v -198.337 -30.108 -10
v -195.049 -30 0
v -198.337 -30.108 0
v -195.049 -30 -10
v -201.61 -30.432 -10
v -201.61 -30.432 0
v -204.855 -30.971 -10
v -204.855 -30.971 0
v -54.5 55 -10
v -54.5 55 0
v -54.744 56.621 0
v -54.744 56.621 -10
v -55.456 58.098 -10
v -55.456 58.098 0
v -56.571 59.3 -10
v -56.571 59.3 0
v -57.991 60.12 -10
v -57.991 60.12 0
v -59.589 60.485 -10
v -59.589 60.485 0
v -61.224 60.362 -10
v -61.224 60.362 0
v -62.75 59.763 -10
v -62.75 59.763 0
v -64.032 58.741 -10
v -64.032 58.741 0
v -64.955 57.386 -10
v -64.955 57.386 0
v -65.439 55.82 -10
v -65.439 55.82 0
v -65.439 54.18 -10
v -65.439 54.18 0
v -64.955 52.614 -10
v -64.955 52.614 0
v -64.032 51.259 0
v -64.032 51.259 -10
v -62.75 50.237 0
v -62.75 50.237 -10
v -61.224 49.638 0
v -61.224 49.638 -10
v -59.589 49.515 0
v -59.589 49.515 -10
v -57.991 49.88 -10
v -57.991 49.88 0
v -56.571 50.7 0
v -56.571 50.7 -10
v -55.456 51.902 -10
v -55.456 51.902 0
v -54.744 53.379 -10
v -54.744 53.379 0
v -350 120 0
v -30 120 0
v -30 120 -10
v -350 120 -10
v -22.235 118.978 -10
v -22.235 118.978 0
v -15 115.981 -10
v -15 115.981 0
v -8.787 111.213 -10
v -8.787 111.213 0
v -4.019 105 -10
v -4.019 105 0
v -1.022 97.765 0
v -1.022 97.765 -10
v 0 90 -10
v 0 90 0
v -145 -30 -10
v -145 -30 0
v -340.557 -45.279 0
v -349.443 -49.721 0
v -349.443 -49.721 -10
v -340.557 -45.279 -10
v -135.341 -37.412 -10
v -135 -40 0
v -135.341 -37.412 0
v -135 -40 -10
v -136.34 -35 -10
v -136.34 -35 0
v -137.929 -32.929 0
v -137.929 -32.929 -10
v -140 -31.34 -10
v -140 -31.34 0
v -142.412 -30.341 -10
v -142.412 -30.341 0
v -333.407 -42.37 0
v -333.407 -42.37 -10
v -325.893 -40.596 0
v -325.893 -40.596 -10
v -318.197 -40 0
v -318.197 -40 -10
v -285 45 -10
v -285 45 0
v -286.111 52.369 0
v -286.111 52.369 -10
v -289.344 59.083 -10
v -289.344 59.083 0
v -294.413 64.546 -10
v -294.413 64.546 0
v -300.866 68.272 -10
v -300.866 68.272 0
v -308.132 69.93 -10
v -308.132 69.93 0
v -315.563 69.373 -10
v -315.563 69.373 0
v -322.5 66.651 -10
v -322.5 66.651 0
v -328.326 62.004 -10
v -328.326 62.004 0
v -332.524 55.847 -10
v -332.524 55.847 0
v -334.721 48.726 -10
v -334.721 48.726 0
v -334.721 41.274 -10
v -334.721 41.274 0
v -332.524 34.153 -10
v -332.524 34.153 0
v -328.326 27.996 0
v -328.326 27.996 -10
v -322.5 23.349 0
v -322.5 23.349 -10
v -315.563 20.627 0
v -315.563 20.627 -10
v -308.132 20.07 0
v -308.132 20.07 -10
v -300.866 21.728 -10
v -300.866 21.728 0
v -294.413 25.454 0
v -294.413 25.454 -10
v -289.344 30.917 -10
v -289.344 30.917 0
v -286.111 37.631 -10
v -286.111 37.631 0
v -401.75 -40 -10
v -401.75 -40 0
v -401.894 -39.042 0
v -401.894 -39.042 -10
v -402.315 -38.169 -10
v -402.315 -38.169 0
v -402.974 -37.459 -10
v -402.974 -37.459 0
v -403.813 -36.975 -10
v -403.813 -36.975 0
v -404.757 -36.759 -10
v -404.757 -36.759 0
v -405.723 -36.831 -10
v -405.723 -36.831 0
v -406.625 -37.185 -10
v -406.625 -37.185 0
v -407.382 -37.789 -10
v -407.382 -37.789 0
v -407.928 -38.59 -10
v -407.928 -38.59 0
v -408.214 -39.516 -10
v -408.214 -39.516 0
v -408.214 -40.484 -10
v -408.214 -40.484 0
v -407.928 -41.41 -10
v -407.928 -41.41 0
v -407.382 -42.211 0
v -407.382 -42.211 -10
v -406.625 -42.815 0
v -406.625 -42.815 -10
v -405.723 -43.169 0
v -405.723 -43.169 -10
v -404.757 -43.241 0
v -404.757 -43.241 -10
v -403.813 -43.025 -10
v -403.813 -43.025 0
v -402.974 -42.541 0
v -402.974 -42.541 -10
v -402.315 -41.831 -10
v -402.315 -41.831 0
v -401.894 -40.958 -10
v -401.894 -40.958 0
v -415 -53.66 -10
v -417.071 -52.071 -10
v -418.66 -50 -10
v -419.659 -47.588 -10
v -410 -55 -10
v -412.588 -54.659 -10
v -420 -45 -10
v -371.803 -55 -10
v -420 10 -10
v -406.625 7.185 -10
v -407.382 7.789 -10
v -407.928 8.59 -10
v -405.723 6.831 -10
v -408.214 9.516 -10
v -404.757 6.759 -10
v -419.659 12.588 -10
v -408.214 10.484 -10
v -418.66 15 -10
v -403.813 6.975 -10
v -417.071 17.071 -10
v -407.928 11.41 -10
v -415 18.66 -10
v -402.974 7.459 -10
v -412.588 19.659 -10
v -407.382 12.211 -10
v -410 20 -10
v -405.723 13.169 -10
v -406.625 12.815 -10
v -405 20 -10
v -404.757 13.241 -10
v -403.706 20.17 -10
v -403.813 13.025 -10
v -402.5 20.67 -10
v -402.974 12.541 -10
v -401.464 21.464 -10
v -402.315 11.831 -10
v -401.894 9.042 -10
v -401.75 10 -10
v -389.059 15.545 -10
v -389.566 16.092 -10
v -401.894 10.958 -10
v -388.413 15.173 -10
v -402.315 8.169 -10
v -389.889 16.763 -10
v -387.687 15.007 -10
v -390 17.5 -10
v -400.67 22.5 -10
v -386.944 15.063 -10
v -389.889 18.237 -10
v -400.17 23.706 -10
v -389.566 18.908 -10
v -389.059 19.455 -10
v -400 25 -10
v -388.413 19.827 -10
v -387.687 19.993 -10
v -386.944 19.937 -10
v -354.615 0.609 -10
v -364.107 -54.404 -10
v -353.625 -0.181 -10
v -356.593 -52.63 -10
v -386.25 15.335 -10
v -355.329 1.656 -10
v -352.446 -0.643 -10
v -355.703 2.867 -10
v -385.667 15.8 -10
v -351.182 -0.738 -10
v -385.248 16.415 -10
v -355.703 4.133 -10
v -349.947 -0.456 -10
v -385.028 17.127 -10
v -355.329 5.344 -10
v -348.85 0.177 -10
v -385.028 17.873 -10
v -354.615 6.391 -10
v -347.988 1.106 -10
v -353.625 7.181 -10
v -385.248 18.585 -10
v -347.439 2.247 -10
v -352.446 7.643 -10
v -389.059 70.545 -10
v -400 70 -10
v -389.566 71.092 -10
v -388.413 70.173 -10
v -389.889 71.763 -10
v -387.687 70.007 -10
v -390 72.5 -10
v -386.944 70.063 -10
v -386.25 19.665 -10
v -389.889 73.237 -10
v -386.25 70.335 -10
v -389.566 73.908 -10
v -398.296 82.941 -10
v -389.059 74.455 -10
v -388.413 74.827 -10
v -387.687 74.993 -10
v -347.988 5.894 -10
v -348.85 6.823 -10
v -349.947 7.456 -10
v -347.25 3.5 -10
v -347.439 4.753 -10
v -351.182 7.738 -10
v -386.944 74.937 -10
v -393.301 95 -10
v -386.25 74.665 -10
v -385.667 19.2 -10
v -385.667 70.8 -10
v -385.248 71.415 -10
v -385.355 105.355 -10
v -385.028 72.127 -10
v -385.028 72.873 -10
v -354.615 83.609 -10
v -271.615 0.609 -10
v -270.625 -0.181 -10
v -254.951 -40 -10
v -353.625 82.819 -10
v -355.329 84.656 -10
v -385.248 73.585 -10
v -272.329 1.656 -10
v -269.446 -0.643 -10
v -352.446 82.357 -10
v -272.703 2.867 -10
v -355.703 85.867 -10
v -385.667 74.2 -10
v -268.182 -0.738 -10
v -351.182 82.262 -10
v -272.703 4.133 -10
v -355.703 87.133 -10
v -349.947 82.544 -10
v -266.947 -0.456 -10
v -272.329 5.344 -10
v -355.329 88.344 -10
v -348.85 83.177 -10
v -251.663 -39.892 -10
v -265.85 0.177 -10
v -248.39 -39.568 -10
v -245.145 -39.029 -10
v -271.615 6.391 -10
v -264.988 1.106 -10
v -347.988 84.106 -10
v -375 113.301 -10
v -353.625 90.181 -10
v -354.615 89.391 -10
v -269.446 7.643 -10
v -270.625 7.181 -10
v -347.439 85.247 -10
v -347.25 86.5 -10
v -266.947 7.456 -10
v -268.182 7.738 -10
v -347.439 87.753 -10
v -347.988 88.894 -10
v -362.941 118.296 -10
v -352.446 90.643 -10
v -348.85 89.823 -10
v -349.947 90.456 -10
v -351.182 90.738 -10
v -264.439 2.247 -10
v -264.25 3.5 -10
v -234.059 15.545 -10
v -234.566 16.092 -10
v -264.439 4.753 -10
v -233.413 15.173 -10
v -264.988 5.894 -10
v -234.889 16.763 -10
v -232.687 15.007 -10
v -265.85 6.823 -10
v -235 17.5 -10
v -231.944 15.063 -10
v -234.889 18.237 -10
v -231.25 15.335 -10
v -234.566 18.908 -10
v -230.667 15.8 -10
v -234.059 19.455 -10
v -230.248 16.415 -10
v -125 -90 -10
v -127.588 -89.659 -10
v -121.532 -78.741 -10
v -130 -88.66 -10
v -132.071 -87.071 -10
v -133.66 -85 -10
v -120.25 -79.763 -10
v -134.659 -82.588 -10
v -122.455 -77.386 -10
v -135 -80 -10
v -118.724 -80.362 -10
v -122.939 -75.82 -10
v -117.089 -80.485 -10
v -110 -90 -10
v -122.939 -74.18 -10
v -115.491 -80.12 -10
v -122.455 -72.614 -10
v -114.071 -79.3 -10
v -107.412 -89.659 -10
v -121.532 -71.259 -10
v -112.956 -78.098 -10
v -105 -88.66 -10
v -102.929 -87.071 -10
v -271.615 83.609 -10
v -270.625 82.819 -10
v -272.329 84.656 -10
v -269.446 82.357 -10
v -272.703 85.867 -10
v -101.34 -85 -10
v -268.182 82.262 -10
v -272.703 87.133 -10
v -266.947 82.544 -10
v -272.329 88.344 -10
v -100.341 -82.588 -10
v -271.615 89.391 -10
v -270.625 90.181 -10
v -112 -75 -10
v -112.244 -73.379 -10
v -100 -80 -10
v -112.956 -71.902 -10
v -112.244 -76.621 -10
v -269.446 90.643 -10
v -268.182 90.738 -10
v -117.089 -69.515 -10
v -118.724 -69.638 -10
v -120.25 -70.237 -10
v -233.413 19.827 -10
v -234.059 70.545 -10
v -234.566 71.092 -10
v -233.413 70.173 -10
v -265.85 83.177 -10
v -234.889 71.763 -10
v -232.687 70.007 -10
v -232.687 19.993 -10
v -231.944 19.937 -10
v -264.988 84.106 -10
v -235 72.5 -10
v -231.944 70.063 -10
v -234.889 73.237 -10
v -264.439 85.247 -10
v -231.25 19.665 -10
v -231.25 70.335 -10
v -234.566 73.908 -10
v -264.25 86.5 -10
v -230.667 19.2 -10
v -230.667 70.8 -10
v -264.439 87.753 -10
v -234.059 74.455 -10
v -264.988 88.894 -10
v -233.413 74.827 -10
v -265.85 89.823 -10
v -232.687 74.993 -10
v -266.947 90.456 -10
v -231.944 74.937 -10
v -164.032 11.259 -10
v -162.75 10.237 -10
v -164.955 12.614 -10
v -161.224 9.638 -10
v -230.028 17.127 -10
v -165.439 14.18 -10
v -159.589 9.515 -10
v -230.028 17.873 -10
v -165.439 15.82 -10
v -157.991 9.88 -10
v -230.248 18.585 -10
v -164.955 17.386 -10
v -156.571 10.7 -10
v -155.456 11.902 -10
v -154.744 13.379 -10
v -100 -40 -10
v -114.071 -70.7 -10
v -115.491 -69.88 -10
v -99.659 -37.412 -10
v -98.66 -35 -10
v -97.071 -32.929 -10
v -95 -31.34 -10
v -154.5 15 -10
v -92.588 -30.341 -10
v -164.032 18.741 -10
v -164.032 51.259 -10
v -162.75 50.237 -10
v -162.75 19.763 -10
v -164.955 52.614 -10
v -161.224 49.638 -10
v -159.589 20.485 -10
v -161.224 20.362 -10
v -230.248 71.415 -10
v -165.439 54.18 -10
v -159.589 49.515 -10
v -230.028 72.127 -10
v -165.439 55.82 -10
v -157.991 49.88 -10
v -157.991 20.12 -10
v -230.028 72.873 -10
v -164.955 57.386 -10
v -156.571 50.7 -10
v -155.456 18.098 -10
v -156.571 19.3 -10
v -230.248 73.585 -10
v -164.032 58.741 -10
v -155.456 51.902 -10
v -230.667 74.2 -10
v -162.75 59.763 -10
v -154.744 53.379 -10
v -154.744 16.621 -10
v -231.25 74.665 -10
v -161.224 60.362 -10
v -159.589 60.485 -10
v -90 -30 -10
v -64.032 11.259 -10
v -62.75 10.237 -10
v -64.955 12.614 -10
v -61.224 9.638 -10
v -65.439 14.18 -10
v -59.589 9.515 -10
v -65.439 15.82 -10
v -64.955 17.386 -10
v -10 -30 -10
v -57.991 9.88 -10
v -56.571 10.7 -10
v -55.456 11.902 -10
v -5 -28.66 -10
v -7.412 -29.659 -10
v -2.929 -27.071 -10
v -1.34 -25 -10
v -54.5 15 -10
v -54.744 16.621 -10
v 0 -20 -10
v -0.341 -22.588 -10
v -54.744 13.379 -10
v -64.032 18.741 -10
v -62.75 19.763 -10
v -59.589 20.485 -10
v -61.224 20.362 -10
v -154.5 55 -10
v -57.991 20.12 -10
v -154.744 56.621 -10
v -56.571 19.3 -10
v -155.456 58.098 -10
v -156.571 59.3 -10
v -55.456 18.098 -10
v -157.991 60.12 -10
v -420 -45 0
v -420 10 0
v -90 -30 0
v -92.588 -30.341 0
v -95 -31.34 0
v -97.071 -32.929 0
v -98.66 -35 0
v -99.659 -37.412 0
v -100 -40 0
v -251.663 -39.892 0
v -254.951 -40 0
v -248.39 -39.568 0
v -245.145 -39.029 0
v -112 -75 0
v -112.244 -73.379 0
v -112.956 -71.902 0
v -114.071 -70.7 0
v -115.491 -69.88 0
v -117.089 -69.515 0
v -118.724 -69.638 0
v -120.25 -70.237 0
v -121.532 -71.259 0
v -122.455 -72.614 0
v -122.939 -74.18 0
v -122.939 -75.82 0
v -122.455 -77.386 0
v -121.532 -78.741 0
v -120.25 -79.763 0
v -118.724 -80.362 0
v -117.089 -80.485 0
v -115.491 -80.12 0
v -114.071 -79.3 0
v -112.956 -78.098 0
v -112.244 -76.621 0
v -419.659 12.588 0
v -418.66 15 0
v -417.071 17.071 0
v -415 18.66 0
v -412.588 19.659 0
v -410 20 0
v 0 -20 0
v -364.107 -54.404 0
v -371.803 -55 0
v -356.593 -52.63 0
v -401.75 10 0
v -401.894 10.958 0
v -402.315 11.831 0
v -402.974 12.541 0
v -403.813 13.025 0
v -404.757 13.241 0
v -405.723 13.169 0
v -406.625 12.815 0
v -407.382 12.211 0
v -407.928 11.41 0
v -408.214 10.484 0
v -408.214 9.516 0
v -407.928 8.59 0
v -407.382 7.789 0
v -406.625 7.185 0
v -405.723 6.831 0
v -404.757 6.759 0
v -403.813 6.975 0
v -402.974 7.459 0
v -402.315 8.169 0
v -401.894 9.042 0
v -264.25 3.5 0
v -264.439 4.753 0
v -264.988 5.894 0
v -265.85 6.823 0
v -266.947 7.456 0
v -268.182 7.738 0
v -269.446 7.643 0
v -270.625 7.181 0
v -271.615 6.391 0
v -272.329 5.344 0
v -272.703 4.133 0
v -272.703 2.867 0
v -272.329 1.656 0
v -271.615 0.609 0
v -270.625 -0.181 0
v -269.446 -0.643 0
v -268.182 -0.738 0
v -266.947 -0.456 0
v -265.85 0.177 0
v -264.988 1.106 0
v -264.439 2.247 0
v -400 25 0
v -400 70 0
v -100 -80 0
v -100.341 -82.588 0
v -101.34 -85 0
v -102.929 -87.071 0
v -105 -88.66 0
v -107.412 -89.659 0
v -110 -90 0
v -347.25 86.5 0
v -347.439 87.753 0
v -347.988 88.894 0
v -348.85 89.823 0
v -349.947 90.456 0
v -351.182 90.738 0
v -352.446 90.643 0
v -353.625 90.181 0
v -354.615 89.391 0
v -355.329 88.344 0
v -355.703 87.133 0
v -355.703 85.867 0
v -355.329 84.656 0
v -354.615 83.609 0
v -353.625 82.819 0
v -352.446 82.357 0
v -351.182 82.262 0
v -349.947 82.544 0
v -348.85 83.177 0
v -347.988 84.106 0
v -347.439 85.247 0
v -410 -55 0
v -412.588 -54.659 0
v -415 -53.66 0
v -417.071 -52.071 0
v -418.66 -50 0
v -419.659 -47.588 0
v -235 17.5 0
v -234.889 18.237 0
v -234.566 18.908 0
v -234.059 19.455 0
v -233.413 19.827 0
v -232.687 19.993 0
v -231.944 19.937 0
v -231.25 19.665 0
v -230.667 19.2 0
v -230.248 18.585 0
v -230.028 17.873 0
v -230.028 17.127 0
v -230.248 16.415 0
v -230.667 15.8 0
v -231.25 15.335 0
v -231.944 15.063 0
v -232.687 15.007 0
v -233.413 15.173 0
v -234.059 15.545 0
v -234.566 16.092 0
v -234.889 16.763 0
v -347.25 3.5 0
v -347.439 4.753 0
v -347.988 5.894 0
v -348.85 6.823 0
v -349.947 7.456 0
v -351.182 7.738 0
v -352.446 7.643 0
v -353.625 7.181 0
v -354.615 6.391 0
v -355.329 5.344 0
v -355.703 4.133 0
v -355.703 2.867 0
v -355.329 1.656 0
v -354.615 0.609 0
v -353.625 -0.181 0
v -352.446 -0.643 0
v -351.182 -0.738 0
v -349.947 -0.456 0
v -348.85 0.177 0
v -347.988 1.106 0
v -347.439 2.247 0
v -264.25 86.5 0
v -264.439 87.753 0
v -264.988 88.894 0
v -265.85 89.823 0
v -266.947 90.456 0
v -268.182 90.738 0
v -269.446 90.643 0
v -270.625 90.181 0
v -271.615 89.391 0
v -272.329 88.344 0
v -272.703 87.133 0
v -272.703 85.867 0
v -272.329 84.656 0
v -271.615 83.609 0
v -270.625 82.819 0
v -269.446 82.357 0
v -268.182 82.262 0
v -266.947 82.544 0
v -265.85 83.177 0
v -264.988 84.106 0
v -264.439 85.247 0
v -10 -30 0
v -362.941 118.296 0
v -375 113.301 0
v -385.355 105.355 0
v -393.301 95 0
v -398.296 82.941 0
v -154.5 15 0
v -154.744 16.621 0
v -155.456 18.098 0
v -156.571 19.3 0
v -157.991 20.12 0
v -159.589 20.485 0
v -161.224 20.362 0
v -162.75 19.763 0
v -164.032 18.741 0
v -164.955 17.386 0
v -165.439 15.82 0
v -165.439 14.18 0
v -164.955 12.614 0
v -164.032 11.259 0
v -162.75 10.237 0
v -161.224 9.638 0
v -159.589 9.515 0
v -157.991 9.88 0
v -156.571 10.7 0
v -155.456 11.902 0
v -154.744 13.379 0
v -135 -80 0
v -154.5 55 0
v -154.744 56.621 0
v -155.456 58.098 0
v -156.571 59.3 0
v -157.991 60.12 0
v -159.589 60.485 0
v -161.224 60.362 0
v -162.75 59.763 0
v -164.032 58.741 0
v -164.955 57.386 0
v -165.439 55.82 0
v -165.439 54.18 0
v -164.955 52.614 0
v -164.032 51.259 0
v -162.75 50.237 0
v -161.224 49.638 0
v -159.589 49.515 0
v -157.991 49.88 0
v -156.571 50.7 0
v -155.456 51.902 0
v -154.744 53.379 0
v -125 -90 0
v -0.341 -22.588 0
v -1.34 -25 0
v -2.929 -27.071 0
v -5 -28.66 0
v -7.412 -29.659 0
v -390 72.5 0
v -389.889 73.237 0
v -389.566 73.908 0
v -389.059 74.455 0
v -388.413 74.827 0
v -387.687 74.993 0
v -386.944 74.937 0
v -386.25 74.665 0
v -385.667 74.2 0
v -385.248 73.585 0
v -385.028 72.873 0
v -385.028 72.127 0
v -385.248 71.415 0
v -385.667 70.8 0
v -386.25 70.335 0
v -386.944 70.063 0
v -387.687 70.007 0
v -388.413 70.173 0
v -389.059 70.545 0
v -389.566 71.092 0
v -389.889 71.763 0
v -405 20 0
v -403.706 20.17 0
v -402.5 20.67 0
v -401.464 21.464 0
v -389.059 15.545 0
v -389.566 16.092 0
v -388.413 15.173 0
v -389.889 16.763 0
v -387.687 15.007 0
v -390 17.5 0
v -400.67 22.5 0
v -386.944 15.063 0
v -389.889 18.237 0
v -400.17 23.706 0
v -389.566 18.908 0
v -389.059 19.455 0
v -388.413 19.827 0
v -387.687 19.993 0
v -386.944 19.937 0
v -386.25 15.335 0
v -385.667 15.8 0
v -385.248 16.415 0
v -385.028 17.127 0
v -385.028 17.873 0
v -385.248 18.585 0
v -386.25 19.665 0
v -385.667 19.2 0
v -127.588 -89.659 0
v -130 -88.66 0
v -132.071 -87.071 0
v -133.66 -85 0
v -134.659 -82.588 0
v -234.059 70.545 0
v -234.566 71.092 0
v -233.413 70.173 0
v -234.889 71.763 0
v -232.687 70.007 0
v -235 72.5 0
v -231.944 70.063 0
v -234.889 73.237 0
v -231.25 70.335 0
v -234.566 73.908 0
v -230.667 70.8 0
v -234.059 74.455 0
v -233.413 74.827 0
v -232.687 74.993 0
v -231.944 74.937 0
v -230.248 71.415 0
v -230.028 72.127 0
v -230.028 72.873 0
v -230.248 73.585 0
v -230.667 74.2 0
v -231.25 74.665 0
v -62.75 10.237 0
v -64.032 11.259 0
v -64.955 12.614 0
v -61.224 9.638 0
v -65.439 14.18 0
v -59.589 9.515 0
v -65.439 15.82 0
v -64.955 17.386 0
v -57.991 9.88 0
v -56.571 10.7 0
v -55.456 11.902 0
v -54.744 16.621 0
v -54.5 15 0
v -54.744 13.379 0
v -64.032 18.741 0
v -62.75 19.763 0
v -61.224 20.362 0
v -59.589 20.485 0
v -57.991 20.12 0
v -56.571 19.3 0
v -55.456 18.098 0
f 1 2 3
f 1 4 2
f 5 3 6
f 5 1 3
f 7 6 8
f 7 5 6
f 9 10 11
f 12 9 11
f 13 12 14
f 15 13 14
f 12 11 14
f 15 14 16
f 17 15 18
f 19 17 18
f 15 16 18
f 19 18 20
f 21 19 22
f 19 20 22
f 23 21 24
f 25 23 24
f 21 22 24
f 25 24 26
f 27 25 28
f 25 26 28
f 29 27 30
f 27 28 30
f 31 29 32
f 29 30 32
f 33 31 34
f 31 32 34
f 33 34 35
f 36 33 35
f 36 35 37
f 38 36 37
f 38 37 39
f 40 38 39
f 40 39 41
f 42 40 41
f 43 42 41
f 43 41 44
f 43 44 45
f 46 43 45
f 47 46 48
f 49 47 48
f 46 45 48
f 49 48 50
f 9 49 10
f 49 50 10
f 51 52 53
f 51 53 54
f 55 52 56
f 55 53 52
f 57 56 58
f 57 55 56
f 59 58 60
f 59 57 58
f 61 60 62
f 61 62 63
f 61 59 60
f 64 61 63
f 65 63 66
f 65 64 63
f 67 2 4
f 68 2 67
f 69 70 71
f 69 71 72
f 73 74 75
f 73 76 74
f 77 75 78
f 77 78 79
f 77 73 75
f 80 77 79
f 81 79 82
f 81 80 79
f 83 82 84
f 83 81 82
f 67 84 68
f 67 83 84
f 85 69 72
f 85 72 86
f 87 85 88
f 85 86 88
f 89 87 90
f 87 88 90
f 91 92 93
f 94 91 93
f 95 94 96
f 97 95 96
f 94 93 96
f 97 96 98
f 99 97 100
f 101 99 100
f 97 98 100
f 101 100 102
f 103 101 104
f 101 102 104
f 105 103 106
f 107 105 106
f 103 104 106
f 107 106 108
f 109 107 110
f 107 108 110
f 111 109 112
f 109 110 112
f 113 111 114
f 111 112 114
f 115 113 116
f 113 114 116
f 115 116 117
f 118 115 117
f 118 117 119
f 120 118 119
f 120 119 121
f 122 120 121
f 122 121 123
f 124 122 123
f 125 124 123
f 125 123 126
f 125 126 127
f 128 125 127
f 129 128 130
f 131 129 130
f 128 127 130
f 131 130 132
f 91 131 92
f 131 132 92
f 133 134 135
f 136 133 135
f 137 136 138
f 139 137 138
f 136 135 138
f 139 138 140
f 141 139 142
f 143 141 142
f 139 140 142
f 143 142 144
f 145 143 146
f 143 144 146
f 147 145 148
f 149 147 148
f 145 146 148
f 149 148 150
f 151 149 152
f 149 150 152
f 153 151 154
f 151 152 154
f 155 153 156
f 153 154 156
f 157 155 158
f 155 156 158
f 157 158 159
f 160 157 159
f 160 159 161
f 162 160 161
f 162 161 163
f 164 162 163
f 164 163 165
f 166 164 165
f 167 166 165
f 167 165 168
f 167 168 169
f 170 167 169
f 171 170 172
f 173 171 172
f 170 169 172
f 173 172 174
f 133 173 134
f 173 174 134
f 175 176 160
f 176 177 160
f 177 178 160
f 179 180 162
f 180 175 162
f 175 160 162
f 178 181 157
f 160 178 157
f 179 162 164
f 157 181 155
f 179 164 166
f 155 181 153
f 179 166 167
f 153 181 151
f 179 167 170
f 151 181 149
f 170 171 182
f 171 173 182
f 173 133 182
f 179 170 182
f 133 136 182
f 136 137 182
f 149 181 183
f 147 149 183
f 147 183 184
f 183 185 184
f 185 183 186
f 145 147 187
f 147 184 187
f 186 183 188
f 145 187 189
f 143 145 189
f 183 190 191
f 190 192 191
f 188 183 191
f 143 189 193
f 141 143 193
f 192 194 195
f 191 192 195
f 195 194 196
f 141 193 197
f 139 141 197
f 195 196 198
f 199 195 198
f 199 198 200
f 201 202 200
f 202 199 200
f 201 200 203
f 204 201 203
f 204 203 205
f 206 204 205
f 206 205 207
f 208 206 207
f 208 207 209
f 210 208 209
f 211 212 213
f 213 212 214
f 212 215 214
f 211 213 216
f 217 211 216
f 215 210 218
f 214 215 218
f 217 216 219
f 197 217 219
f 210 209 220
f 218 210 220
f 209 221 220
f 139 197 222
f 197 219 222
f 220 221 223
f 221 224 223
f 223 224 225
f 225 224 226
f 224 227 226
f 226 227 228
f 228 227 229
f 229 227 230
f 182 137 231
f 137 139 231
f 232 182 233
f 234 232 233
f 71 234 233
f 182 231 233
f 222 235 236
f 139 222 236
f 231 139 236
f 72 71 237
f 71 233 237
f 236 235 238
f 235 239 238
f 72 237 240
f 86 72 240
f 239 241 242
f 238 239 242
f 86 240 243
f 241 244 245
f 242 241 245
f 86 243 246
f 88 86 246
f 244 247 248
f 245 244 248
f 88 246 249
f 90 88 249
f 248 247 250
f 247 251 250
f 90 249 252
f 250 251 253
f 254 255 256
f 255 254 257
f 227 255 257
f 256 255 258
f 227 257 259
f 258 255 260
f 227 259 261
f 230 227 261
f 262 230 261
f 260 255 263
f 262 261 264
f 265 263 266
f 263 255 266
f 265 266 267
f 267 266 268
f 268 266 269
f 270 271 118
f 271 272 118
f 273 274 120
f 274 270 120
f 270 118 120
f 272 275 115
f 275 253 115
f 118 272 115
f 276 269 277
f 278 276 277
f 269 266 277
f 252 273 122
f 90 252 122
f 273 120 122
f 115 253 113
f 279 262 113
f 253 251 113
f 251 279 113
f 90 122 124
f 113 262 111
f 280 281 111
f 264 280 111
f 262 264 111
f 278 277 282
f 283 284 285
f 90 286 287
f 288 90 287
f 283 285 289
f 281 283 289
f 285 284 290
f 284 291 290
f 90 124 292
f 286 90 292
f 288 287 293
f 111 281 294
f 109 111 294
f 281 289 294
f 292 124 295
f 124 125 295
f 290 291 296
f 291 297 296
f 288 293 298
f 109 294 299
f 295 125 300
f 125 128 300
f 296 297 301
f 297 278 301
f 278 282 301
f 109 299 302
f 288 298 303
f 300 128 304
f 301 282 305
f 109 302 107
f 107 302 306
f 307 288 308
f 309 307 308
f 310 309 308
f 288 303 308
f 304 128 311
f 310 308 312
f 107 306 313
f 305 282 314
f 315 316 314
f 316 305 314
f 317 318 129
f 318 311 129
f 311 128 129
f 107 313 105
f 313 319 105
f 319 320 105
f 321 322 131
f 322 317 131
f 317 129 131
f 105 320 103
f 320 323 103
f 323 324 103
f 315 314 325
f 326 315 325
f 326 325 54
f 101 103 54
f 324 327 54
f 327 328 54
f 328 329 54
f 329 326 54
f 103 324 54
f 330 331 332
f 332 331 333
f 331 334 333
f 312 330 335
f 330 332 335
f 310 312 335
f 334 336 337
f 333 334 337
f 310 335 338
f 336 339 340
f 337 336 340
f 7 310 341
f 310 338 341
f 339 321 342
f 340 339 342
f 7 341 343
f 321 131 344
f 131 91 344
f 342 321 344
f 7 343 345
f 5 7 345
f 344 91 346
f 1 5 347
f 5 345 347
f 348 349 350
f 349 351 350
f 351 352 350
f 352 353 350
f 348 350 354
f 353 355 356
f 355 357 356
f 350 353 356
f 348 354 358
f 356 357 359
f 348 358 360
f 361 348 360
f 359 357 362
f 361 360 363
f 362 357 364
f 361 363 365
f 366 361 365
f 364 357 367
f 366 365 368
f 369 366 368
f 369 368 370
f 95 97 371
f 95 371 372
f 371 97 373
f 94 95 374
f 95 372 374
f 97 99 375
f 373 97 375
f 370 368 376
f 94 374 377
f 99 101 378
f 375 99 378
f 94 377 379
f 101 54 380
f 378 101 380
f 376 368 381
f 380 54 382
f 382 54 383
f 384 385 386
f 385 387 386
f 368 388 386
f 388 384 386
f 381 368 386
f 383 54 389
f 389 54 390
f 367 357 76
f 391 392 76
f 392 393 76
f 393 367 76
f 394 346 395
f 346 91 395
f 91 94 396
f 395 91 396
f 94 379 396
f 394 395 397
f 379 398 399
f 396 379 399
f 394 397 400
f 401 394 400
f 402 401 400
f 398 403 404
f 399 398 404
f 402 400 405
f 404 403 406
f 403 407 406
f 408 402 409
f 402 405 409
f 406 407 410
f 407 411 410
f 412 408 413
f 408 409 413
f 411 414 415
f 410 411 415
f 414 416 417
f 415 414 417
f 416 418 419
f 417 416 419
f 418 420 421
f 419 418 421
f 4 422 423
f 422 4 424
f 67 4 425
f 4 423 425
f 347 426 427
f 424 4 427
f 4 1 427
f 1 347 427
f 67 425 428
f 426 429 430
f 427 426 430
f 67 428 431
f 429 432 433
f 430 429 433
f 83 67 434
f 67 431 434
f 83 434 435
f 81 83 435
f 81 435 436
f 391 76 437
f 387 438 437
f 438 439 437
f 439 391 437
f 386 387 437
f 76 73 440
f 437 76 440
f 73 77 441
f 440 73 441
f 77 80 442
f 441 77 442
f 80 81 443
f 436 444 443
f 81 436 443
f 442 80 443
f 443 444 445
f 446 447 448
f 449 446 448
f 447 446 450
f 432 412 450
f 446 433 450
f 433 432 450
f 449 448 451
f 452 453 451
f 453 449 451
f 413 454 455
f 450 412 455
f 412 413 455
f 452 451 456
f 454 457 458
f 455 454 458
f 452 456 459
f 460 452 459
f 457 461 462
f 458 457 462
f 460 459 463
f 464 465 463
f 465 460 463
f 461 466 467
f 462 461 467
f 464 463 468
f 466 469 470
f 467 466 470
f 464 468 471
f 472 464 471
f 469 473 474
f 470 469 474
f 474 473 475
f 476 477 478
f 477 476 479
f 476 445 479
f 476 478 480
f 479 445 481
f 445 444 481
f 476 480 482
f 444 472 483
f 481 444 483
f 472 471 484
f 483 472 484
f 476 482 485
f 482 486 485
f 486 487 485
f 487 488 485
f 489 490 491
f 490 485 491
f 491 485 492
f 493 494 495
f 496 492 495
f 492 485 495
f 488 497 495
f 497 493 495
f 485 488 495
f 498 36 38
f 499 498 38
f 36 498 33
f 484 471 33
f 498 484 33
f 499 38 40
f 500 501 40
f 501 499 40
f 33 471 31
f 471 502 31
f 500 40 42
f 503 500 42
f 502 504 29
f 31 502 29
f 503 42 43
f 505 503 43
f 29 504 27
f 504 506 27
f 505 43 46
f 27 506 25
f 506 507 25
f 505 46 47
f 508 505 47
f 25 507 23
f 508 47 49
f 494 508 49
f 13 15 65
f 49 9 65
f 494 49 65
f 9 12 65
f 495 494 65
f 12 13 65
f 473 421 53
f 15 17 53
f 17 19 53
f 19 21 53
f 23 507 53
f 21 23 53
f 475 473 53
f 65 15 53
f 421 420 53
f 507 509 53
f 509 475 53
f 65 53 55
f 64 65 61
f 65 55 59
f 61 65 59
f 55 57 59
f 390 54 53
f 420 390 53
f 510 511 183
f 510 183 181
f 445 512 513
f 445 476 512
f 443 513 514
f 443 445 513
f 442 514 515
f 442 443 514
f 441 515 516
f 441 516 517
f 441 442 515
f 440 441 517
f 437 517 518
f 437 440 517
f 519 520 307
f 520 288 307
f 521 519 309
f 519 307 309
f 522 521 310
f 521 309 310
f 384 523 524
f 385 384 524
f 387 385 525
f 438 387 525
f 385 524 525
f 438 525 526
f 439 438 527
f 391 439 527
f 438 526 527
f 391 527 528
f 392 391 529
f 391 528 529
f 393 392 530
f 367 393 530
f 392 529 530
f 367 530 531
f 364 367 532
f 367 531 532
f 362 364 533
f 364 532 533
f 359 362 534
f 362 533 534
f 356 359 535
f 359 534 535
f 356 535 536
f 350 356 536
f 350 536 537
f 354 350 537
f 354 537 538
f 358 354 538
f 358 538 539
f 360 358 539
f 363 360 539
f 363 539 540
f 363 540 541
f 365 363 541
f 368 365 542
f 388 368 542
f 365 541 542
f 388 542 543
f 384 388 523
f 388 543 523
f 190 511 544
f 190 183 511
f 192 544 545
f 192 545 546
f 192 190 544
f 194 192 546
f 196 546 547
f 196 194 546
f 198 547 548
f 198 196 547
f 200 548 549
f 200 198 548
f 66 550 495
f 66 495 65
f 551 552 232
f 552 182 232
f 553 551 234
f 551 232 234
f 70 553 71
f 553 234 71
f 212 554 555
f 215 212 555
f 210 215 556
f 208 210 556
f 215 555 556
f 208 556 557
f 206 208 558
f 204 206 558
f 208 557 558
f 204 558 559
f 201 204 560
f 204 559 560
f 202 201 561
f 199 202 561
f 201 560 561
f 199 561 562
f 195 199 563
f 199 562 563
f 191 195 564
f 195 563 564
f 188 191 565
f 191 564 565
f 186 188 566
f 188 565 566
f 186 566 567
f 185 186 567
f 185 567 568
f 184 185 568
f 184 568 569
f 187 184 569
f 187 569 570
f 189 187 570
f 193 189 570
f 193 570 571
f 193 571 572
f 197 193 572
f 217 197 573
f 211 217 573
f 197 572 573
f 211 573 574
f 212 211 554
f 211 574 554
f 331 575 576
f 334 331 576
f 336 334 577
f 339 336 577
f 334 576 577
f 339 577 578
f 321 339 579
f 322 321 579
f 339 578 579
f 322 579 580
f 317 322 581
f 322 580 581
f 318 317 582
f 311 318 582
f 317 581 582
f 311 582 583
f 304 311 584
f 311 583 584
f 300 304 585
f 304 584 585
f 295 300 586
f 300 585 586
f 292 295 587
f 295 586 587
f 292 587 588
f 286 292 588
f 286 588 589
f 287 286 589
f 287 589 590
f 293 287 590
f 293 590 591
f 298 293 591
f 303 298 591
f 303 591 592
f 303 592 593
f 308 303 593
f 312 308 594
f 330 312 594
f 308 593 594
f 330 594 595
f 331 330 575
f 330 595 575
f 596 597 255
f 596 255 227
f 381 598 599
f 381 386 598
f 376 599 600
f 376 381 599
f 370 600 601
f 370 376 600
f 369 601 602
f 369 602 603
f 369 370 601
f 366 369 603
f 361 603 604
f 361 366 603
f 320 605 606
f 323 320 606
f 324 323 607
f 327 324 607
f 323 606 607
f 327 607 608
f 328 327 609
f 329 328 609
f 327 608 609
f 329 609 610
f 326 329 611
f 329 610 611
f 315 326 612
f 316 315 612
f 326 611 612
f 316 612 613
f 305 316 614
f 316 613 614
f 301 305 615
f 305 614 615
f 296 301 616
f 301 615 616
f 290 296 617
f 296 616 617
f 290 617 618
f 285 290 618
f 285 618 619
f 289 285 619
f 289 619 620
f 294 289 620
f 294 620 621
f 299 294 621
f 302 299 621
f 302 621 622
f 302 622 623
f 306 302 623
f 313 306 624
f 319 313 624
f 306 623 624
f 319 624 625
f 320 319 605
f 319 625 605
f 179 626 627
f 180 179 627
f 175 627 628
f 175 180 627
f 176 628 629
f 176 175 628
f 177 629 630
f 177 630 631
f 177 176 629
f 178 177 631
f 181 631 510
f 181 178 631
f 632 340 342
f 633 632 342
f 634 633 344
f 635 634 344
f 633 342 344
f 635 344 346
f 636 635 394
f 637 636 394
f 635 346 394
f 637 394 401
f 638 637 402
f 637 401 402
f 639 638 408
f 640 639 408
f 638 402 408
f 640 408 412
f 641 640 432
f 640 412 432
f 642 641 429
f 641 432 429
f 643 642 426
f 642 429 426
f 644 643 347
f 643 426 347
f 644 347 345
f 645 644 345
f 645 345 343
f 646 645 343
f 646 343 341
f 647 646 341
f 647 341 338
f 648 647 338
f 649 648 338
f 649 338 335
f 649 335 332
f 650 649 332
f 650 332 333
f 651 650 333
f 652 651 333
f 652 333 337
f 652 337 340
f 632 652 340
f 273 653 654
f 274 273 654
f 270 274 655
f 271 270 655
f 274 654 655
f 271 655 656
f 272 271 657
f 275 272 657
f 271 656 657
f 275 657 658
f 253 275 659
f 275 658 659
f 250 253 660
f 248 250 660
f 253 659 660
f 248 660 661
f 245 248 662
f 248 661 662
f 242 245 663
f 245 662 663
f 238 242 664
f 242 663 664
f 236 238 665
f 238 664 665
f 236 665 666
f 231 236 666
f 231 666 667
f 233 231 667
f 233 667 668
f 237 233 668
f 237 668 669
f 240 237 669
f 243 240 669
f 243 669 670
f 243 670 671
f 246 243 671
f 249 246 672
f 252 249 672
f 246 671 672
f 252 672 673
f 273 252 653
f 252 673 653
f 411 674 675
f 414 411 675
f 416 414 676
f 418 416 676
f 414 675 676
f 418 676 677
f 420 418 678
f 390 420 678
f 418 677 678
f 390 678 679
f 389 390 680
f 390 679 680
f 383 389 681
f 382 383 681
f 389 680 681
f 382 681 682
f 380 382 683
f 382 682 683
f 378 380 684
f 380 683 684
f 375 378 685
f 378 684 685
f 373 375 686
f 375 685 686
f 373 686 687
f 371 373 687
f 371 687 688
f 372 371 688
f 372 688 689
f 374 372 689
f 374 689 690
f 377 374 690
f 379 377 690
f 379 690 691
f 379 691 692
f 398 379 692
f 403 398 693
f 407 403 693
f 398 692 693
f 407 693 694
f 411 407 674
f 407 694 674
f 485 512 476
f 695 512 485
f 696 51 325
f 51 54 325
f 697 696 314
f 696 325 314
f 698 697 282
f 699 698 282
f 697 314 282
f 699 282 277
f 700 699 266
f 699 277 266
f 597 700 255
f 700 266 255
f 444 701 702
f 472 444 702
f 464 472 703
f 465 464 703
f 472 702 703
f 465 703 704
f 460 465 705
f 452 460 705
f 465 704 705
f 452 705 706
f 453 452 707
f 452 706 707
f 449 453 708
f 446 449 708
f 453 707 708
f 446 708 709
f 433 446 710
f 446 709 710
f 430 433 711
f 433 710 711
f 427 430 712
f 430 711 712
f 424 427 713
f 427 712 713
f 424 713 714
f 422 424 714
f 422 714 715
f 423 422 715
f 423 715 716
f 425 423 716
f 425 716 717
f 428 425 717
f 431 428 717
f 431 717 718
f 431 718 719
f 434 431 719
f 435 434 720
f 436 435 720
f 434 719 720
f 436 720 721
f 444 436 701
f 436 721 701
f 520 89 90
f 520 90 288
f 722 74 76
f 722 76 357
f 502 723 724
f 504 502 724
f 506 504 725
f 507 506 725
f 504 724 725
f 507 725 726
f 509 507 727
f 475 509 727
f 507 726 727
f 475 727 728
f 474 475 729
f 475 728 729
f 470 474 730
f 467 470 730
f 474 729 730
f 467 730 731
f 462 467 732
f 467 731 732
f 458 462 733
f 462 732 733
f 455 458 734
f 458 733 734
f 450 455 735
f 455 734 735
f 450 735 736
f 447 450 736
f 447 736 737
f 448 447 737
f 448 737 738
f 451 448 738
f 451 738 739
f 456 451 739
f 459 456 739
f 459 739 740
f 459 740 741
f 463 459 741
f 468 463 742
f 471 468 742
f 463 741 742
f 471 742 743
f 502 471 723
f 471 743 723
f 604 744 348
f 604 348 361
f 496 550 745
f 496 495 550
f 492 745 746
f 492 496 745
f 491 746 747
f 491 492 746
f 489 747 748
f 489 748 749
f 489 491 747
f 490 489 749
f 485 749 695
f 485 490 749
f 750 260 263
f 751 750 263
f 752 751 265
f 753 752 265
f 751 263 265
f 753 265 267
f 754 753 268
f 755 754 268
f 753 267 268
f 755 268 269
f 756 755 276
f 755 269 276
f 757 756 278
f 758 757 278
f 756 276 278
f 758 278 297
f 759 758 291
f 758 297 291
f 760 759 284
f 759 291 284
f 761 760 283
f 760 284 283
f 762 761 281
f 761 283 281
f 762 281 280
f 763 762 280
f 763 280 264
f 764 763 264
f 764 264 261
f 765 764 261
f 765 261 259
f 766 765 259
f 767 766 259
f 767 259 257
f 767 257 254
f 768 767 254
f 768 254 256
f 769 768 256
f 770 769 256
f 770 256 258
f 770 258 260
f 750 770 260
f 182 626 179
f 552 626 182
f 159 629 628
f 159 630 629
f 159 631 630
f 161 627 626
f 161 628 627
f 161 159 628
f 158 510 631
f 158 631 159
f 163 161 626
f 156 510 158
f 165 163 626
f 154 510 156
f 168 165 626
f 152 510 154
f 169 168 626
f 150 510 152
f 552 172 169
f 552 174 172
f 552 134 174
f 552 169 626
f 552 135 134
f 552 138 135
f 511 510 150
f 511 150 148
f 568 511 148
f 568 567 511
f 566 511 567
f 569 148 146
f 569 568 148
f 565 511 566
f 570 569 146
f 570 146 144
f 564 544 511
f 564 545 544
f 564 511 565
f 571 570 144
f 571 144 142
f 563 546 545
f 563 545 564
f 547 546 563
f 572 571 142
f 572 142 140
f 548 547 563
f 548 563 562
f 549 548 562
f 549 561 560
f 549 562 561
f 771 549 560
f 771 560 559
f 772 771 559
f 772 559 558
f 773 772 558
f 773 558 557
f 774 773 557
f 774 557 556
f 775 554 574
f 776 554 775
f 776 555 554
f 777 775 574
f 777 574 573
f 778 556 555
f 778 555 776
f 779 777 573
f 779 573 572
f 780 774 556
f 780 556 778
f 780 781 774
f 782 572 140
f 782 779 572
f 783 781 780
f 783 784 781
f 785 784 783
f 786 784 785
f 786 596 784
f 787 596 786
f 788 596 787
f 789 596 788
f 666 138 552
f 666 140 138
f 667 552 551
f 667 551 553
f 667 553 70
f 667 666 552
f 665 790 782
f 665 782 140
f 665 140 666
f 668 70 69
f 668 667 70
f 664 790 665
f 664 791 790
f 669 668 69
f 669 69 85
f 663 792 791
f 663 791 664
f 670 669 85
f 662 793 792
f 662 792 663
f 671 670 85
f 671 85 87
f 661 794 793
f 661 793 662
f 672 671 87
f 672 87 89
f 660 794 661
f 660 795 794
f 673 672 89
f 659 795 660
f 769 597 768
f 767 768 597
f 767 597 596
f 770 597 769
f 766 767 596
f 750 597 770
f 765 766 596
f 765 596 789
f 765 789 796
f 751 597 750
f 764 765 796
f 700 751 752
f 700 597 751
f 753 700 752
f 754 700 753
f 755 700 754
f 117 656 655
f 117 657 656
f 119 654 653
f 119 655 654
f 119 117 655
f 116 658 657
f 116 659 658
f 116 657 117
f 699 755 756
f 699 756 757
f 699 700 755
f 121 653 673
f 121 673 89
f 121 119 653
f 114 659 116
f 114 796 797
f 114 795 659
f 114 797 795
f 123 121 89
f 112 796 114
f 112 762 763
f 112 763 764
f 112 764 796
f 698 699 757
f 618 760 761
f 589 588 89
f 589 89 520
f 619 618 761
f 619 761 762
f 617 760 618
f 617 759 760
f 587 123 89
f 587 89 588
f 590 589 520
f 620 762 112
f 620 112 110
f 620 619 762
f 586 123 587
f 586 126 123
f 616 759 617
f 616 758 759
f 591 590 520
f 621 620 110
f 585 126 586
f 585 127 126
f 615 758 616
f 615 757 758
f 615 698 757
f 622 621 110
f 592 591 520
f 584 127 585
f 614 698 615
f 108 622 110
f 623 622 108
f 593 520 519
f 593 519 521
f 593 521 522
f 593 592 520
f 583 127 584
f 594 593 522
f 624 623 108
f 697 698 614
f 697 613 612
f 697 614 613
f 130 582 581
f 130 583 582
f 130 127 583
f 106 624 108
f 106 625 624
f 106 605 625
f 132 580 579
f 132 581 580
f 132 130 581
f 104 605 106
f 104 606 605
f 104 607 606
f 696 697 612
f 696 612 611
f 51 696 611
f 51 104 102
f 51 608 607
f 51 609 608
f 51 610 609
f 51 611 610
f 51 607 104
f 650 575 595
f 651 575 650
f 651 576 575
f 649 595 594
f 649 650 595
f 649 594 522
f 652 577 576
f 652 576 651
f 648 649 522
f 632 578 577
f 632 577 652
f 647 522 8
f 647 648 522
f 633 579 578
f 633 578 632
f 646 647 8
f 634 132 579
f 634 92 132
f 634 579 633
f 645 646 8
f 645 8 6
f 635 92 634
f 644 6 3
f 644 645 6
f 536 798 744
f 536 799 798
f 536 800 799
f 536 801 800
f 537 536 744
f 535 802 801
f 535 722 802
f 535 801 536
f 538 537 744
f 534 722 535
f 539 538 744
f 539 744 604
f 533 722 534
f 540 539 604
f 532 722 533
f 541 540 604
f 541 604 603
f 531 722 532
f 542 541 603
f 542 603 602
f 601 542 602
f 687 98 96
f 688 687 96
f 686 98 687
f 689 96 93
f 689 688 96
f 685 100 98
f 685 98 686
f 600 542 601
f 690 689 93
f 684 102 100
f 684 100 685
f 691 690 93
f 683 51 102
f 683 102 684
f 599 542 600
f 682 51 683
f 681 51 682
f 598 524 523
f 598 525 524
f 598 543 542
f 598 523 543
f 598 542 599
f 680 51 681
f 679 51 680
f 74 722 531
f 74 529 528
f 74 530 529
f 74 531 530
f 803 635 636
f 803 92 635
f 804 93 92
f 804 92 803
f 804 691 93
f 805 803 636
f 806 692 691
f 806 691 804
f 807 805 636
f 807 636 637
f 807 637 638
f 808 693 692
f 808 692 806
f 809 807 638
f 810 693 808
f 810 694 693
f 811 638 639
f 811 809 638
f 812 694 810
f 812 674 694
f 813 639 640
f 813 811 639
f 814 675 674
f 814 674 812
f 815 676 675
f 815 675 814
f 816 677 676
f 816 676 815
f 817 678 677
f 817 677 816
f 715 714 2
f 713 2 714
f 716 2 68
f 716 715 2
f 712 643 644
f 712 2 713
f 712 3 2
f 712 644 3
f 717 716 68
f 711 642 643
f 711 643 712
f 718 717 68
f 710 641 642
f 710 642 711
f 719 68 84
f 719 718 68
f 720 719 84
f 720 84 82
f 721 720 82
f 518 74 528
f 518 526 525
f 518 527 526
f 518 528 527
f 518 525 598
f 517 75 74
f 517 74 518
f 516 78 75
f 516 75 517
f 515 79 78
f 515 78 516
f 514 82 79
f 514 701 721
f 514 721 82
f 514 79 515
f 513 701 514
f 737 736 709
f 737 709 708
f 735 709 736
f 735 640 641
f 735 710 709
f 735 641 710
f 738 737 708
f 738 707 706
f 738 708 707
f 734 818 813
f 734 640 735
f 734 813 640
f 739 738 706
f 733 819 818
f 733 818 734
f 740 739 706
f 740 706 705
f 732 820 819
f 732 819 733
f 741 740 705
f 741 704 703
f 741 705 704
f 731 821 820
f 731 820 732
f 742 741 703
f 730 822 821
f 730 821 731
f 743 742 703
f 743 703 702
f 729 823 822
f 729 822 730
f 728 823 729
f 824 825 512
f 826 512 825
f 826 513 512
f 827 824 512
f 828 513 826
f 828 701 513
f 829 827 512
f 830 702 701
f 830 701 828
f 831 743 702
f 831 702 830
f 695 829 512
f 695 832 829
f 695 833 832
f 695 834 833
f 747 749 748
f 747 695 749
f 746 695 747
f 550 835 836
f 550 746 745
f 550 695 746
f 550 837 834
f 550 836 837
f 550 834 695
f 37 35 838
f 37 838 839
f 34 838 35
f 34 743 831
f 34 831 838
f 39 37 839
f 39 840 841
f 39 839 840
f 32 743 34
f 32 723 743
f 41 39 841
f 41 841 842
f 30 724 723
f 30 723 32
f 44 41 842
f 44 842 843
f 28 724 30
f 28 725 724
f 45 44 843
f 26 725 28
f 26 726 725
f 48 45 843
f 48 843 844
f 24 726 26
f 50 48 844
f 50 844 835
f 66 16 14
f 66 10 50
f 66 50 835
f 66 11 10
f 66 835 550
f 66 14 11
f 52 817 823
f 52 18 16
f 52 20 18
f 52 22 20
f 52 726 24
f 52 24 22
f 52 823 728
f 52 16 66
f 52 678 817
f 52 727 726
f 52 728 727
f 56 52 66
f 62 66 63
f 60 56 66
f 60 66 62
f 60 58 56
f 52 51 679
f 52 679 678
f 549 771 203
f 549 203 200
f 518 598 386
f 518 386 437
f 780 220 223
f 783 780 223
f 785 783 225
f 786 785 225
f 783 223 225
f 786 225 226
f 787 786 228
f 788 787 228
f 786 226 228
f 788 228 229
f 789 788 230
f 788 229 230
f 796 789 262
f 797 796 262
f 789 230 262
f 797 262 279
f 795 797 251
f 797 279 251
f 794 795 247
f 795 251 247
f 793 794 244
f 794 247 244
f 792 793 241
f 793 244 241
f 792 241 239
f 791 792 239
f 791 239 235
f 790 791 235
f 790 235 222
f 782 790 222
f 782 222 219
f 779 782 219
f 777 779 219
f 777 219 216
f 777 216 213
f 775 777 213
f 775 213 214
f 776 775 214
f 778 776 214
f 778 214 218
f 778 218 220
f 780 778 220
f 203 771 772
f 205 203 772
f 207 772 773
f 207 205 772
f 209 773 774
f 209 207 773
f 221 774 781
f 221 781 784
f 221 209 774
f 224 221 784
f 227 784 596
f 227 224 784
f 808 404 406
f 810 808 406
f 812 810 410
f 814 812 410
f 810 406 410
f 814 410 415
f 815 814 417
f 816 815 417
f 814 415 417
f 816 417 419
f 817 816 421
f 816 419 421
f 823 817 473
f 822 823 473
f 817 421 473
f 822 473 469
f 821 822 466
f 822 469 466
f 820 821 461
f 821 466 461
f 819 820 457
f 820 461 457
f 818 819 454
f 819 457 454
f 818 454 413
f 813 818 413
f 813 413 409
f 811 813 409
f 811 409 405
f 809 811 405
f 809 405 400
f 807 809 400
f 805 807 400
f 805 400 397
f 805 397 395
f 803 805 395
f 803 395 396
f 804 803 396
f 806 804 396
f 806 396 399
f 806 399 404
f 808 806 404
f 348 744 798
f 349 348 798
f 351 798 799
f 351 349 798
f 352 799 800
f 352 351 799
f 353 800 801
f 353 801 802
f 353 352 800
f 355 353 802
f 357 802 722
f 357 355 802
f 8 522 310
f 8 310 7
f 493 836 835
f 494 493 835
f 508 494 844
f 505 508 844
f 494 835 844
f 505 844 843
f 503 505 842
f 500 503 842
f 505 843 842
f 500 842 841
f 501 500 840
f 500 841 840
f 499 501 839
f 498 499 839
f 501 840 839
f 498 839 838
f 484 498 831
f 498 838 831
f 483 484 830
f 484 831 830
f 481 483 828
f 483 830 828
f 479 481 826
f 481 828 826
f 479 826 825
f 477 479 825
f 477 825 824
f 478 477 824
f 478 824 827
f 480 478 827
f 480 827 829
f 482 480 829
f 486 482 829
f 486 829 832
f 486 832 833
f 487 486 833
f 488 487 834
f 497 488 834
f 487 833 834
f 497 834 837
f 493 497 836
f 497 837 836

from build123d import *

# Parameters (mm, degrees)
TABAN_FLAN_1_DEPTH    = 10
IZIM2_R               = 25
IZIM2_R_2             = 4.25
IZIM2_R_3             = 5.5
IZIM2_R_4             = 3.25
KES_EKSTR_ZYON1_DEPTH = 10
RADYUS2_R             = 50
RADYUS3_R             = 30
RADYUS4_R             = 10
RADYUS5_R             = 50
RADYUS6_R             = 10
RADYUS7_R             = 5
IZIM3_R               = 2.5
KES_EKSTR_ZYON2_DEPTH = 29


# Sheet-metal steps are written as plain solids
with BuildPart() as part:
    # Çizim1 → Taban-Flanş1 (new body)
    with BuildSketch(Plane.XY):
        Polygon((0, 120), (-400, 120), (-400, 20), (-420, 20), (-420, -55), (-360, -55), (-330, -40), (-250, -40), (-200, -30), (-135, -30), (-135, -90), (-100, -90), (-100, -30), (0, -30), (0, 0), align=None)
    extrude(amount=-TABAN_FLAN_1_DEPTH)

    # Çizim2 → Kes-Ekstrüzyon1 (cut)
    with BuildSketch(Plane.XY):
        with Locations((-310, 45)):
            Circle(IZIM2_R)
        with Locations((-351.5, 86.5)):
            Circle(IZIM2_R_2)
        with Locations((-268.5, 86.5)):
            Circle(IZIM2_R_2)
        with Locations((-351.5, 3.5)):
            Circle(IZIM2_R_2)
        with Locations((-268.5, 3.5)):
            Circle(IZIM2_R_2)
        with Locations((-60, 55)):
            Circle(IZIM2_R_3)
        with Locations((-160, 55)):
            Circle(IZIM2_R_3)
        with Locations((-160, 15)):
            Circle(IZIM2_R_3)
        with Locations((-60, 15)):
            Circle(IZIM2_R_3)
        with Locations((-117.5, -75)):
            Circle(IZIM2_R_3)
        with Locations((-405, 10)):
            Circle(IZIM2_R_4)
        with Locations((-405, -40)):
            Circle(IZIM2_R_4)
    extrude(amount=-KES_EKSTR_ZYON1_DEPTH, mode=Mode.SUBTRACT)

    # Radyus2
    radyus2_edges = [part.edges().sort_by_distance(p)[0] for p in [
        (-400, 120, -5),
    ]]
    fillet(radyus2_edges, radius=RADYUS2_R)

    # Radyus3
    radyus3_edges = [part.edges().sort_by_distance(p)[0] for p in [
        (0, 120, -5),
    ]]
    fillet(radyus3_edges, radius=RADYUS3_R)

    # Radyus4
    radyus4_edges = [part.edges().sort_by_distance(p)[0] for p in [
        (0, -30, -5),
        (-100, -30, -5),
        (-100, -90, -5),
        (-135, -90, -5),
        (-135, -30, -5),
    ]]
    fillet(radyus4_edges, radius=RADYUS4_R)

    # Radyus5
    radyus5_edges = [part.edges().sort_by_distance(p)[0] for p in [
        (-200, -30, -5),
        (-250, -40, -5),
        (-330, -40, -5),
        (-360, -55, -5),
    ]]
    fillet(radyus5_edges, radius=RADYUS5_R)

    # Radyus6
    radyus6_edges = [part.edges().sort_by_distance(p)[0] for p in [
        (-420, -55, -5),
        (-420, 20, -5),
    ]]
    fillet(radyus6_edges, radius=RADYUS6_R)

    # Radyus7
    radyus7_edges = [part.edges().sort_by_distance(p)[0] for p in [
        (-400, 20, -5),
    ]]
    fillet(radyus7_edges, radius=RADYUS7_R)

    # Çizim3 → Kes-Ekstrüzyon2 (cut)
    with BuildSketch(Plane(origin=(0, 0, -10), x_dir=(-1, 0, 0), z_dir=(0, 0, -1))):
        with Locations((232.5, 72.5)):
            Circle(IZIM3_R)
        with Locations((232.5, 17.5)):
            Circle(IZIM3_R)
        with Locations((387.5, 17.5)):
            Circle(IZIM3_R)
        with Locations((387.5, 72.5)):
            Circle(IZIM3_R)
    extrude(amount=-KES_EKSTR_ZYON2_DEPTH, mode=Mode.SUBTRACT)


solid = part.part
